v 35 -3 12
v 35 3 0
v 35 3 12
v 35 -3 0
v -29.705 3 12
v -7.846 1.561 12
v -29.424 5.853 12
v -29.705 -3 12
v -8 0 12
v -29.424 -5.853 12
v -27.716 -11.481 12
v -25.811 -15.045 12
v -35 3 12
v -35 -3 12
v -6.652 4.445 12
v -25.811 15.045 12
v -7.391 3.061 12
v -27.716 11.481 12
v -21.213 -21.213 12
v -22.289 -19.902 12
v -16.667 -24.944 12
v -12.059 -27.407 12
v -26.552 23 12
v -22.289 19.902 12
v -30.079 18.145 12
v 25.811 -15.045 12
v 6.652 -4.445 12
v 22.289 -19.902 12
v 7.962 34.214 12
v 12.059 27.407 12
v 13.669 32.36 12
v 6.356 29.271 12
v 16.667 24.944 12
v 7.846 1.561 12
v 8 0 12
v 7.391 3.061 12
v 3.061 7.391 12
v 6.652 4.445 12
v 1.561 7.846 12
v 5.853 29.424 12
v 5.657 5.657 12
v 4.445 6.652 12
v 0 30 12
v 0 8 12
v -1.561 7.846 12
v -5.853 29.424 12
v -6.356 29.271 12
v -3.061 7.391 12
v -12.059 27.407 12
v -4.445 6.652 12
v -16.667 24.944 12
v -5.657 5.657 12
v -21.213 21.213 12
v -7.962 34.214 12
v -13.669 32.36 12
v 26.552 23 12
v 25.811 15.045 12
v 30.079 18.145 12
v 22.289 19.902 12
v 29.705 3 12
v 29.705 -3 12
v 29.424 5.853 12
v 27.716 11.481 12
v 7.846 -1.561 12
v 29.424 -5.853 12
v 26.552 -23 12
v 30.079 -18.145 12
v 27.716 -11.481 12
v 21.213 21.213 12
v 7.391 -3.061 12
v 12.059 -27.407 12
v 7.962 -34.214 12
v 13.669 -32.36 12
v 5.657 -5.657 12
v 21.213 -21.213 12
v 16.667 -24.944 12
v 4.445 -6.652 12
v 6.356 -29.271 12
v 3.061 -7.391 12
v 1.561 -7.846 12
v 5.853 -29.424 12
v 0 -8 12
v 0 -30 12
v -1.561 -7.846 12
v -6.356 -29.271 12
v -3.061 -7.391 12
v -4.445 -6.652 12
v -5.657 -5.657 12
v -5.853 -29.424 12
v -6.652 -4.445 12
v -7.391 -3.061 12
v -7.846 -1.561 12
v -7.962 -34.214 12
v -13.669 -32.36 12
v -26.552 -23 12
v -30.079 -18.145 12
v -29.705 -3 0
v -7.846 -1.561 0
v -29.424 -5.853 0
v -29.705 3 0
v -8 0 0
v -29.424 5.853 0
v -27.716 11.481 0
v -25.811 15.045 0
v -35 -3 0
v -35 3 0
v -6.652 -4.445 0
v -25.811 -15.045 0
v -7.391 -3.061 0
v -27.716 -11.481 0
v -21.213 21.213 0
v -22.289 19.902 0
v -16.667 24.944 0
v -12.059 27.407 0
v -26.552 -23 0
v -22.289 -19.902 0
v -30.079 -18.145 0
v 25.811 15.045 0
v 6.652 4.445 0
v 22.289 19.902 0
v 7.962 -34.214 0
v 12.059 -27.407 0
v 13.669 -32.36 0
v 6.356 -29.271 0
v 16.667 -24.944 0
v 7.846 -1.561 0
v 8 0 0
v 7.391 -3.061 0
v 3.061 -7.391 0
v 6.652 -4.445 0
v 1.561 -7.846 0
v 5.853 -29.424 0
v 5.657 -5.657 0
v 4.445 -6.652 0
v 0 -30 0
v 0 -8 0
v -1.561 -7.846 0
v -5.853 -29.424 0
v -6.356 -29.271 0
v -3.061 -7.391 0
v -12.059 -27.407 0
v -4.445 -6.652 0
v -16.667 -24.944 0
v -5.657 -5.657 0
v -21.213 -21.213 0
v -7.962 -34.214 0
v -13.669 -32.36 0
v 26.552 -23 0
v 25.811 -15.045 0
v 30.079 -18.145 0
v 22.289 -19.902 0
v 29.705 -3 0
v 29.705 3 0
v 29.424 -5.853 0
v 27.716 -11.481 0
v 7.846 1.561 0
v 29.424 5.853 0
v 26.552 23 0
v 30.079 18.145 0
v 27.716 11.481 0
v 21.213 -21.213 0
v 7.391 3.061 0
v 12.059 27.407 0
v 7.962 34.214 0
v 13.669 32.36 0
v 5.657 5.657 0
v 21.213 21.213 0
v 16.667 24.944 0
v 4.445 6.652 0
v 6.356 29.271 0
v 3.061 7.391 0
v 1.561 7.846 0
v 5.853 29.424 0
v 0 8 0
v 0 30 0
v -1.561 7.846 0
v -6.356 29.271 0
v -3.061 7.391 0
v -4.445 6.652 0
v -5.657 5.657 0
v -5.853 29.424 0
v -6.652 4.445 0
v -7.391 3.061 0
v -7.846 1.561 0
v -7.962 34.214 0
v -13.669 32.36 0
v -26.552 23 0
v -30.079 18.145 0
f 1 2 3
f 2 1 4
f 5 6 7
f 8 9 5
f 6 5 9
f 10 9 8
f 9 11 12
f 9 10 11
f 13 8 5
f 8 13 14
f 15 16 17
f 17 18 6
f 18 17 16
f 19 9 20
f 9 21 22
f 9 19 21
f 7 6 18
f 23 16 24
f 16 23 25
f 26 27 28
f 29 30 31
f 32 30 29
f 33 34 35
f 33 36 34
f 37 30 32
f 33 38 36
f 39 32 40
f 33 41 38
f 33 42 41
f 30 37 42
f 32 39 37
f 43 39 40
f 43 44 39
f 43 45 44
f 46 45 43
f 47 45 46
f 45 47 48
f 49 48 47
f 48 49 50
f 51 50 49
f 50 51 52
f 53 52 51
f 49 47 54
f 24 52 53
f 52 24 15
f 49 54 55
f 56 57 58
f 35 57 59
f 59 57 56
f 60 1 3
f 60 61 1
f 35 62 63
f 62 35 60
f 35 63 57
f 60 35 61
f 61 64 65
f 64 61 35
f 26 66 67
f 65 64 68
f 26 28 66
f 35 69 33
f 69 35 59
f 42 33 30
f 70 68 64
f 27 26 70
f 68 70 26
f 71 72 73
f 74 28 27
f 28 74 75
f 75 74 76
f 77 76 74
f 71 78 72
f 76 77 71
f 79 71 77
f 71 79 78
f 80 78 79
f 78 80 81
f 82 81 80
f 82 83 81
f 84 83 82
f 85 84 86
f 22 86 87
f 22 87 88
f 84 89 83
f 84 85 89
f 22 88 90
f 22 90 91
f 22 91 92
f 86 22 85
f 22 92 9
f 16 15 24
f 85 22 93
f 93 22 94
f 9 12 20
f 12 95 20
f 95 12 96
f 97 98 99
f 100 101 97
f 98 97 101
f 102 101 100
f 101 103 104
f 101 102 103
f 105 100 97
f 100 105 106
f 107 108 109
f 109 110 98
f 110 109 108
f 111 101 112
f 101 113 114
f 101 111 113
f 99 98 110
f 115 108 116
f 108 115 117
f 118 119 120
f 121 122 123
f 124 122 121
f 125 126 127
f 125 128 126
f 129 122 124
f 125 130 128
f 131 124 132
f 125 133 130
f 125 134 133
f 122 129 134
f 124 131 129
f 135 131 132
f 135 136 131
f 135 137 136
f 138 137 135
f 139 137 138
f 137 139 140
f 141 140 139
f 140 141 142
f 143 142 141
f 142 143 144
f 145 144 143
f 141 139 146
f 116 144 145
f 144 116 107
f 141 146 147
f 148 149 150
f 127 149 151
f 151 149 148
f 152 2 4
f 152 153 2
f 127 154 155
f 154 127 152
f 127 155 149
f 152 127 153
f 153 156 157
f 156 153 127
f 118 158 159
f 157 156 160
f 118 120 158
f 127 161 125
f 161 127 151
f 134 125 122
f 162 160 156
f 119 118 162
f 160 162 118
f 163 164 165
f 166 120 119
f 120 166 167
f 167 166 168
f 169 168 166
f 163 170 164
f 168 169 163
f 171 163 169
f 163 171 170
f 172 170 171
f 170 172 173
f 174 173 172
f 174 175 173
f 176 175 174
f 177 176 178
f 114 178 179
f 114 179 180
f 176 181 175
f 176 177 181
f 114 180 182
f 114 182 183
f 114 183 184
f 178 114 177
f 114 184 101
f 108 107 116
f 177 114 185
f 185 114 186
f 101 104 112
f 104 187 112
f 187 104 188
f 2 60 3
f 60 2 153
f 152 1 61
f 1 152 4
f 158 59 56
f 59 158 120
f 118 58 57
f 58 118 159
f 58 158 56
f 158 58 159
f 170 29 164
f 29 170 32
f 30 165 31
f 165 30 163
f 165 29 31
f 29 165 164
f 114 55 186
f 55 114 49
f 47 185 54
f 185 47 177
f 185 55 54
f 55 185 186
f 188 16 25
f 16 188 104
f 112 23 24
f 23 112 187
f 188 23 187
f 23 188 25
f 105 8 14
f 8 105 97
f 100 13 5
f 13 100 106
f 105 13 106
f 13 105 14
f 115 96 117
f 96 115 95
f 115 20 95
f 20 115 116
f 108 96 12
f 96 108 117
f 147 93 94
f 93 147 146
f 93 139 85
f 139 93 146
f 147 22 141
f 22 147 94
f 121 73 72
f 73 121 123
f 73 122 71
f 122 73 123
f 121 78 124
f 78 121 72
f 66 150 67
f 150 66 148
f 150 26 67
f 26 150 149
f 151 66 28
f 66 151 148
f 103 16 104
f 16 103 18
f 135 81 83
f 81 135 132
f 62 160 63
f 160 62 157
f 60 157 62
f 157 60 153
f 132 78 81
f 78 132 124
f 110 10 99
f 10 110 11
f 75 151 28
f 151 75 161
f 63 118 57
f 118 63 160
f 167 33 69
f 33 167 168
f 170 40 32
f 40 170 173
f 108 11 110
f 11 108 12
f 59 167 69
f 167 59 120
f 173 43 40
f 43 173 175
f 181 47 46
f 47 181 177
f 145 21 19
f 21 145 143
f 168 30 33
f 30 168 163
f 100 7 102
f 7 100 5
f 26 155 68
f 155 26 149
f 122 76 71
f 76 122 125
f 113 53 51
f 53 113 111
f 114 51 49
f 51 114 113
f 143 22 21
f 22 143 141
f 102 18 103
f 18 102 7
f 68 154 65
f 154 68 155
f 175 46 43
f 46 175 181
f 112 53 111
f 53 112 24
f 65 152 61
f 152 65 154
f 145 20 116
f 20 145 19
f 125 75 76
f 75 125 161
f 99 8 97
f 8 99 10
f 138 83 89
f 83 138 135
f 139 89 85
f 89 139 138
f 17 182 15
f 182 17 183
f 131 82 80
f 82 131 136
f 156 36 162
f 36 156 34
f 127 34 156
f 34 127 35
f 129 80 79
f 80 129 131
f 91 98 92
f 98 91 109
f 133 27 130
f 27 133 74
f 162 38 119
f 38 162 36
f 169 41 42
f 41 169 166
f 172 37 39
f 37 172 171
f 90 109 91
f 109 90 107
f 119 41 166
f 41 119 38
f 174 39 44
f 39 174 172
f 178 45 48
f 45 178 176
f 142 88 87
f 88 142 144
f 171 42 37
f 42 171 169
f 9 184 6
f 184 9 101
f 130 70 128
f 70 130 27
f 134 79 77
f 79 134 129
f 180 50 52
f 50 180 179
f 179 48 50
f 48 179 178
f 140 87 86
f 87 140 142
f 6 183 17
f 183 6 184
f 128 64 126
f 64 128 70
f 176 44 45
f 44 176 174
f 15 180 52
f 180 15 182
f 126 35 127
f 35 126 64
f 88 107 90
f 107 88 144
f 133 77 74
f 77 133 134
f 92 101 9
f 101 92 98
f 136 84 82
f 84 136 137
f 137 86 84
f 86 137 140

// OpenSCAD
$fn = 32;

// ----------------------------------------------------------------------
// Spur blank: bored gear blank
// ----------------------------------------------------------------------

// --- parameters (mm) ---
disc_r = 30;              // blank root radius
disc_t = 12;              // blank thickness
n_teeth = 10;             // stub tooth count
tooth_w = 6;              // tooth width at the root
tooth_h = 5;              // tooth height above the root
bore_r = 8;               // central bore radius
fit_tol = 0.1;            // tolerance for press fits, mm
free_tol = 0.5;           // tolerance for clearance fits, mm

out_r = disc_r + tooth_h;  // tip radius
bbox_x = 70.0;  // measured width over the teeth
bbox_y = 68.43;  // measured depth over the teeth

difference() {
union() {
  cylinder(r = disc_r, h = disc_t);
  for (i = [0 : n_teeth - 1])
    rotate([0, 0, i * 360 / n_teeth])
      translate([disc_r - 1, -tooth_w / 2, 0])
        cube([tooth_h + 1, tooth_w, disc_t]);
}
  translate([0, 0, -1]) cylinder(r = bore_r, h = disc_t + 2);
}
